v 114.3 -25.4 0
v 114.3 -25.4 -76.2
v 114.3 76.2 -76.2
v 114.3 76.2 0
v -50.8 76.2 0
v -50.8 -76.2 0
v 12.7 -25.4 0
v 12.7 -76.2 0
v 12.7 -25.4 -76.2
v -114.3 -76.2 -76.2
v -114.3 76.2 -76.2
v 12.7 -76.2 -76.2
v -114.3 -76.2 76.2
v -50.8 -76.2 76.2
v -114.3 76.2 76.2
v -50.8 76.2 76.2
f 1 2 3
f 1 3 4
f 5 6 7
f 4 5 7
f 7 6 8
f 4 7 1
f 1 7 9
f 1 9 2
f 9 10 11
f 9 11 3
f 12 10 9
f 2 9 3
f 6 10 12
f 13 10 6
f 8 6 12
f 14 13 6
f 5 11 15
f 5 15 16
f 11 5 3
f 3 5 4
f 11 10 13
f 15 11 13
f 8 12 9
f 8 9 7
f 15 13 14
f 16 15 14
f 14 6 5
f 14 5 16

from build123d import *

# Parameters (mm, degrees)
F0_W     = 228.6
F0_H     = 152.4
F1_DEPTH = 76.2
F2_W     = 165.1
F2_H     = 76.2
F3_DEPTH = 152.401
F4_W     = 101.6
F4_H     = 76.2
F5_DEPTH = 50.8


with BuildPart() as f1:
    # F0 (on Front) → F1 (new body, symmetric)
    with BuildSketch(Plane.XZ):
        Rectangle(F0_W, F0_H)
    extrude(amount=F1_DEPTH, both=True)

    # F2 (on face) → F3 (cut, through all)
    with BuildSketch(Plane.XZ.offset(76.2)):
        with Locations((31.75, 38.1)):
            Rectangle(F2_W, F2_H)
    extrude(amount=-F3_DEPTH, mode=Mode.SUBTRACT)

    # F4 (on face) → F5 (cut)
    with BuildSketch(Plane.XZ.offset(76.2)):
        with Locations((63.5, -38.1)):
            Rectangle(F4_W, F4_H)
    extrude(amount=-F5_DEPTH, mode=Mode.SUBTRACT)


solid = f1.part
